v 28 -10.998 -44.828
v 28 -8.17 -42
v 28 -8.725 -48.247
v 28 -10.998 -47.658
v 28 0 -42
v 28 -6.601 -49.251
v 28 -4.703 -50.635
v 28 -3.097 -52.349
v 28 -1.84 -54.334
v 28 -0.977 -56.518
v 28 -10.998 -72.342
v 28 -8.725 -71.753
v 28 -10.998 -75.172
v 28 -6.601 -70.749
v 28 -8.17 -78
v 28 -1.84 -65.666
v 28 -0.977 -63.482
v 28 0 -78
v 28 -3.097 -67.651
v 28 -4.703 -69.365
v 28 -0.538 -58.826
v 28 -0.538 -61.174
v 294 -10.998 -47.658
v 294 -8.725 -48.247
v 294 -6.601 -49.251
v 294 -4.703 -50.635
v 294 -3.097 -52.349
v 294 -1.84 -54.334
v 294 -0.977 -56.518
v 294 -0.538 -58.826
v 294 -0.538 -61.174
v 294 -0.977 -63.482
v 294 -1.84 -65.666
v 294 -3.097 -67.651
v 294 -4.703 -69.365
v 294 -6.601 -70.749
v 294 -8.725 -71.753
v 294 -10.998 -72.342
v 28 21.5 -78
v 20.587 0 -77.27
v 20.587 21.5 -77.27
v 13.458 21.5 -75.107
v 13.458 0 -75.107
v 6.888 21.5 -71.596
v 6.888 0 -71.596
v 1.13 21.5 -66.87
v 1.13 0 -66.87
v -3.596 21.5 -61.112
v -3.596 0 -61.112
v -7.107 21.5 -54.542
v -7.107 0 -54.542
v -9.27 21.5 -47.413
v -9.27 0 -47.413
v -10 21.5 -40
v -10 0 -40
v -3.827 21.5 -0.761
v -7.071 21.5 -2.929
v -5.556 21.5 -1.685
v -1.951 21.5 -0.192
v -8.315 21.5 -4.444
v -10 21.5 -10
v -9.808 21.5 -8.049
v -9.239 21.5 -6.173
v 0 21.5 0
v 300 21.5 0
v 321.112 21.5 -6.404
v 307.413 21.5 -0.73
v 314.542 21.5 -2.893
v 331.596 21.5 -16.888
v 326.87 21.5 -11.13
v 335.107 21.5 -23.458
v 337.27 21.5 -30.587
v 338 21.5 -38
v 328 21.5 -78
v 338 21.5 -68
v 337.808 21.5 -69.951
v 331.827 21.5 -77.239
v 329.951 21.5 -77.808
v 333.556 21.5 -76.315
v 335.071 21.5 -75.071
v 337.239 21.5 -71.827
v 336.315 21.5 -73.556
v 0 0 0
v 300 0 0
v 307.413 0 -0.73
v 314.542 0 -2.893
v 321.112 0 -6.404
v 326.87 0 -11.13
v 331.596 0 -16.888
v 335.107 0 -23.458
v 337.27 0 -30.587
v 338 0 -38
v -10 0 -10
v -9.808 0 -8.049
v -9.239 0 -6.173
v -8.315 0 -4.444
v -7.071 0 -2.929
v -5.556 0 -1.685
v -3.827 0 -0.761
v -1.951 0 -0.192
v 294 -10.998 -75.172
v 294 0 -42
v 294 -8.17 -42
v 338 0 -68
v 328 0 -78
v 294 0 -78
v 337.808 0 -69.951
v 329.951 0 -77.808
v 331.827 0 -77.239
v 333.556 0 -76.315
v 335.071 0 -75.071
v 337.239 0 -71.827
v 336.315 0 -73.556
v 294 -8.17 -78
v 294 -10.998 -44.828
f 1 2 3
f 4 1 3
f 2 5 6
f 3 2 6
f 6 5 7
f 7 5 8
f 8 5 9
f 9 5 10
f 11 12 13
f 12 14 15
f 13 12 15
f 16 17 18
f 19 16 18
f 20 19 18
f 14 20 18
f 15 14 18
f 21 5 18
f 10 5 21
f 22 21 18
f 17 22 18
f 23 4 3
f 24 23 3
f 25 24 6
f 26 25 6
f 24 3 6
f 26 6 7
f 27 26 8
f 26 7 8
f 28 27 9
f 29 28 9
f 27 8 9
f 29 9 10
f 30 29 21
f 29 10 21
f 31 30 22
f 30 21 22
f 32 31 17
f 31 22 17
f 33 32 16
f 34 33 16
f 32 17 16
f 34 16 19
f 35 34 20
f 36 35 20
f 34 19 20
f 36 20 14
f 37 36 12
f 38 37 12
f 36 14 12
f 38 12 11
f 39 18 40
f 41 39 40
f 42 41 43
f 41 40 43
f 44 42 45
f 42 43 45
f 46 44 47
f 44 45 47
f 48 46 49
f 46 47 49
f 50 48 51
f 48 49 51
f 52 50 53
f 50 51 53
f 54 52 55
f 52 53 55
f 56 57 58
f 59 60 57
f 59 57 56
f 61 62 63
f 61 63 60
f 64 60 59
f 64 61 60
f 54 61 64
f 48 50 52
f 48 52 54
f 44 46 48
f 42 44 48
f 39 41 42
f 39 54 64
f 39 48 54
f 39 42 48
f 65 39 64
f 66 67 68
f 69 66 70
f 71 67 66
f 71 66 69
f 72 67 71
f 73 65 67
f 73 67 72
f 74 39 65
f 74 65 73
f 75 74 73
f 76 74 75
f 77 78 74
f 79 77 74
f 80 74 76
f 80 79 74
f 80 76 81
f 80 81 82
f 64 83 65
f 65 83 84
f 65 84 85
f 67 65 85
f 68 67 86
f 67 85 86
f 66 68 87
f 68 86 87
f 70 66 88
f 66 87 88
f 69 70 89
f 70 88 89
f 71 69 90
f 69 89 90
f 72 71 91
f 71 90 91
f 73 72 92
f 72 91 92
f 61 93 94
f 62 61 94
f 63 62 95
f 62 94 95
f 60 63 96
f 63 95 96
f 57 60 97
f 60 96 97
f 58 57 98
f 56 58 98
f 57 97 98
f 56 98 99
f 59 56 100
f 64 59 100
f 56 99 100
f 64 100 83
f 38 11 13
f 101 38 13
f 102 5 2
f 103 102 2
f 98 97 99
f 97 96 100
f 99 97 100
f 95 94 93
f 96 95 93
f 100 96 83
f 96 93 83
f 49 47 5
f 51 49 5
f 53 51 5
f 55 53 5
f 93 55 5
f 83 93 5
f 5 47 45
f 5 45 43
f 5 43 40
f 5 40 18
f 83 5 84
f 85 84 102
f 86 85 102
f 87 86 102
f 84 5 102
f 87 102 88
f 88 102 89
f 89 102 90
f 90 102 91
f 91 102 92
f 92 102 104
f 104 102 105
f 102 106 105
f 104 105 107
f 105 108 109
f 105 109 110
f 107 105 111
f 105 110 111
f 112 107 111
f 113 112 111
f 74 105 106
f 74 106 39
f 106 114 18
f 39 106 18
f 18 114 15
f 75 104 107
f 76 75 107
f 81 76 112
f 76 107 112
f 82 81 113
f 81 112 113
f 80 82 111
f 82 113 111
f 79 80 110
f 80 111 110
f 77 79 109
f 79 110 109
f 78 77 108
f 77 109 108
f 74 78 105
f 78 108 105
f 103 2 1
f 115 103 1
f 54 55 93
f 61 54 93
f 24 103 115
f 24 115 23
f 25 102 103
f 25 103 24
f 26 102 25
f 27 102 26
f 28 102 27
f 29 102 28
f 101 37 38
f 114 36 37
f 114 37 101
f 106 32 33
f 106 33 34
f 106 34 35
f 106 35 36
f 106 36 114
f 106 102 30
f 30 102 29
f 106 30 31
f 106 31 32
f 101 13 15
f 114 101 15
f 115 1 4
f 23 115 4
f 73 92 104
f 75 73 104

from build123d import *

# Parameters (mm, degrees)
BOSS_EXTRUDE2_DEPTH = 21.5
BOSS_EXTRUDE3_DEPTH = 266


with BuildPart() as part:
    # Sketch1 → Boss-Extrude2 (new body)
    with BuildSketch(Plane(origin=(0, 0, 0), x_dir=(1, 0, 0), z_dir=(0, 1, 0))):
        with BuildLine():
            Line((0, 0), (300, 0))
            ThreePointArc((300, 0), (326.870057685, 11.129942315), (338, 38))
            Line((338, 38), (338, 68))
            ThreePointArc((338, 68), (335.071067812, 75.071067812), (328, 78))
            Line((328, 78), (28, 78))
            ThreePointArc((28, 78), (1.129942315, 66.870057685), (-10, 40))
            Line((-10, 40), (-10, 10))
            ThreePointArc((-10, 10), (-7.071067812, 2.928932188), (0, 0))
        make_face()
    extrude(amount=BOSS_EXTRUDE2_DEPTH)

    # Sketch5 → Boss-Extrude3 (add)
    with BuildSketch(Plane(origin=(28, 0, 0), x_dir=(0, 0, -1), z_dir=(1, 0, 0))):
        with BuildLine():
            Line((78, 0), (42, 0))
            Line((42, 0), (42, -8.17))
            Line((42, -8.17), (44.828427125, -10.998427125))
            Line((44.828427125, -10.998427125), (47.658427125, -10.998427125))
            ThreePointArc((47.658427125, -10.998427125), (60, -0.482256494), (72.341572875, -10.998427125))
            Line((72.341572875, -10.998427125), (75.171572875, -10.998427125))
            Line((75.171572875, -10.998427125), (78, -8.17))
            Line((78, -8.17), (78, 0))
        make_face()
    extrude(amount=BOSS_EXTRUDE3_DEPTH)


solid = part.part
